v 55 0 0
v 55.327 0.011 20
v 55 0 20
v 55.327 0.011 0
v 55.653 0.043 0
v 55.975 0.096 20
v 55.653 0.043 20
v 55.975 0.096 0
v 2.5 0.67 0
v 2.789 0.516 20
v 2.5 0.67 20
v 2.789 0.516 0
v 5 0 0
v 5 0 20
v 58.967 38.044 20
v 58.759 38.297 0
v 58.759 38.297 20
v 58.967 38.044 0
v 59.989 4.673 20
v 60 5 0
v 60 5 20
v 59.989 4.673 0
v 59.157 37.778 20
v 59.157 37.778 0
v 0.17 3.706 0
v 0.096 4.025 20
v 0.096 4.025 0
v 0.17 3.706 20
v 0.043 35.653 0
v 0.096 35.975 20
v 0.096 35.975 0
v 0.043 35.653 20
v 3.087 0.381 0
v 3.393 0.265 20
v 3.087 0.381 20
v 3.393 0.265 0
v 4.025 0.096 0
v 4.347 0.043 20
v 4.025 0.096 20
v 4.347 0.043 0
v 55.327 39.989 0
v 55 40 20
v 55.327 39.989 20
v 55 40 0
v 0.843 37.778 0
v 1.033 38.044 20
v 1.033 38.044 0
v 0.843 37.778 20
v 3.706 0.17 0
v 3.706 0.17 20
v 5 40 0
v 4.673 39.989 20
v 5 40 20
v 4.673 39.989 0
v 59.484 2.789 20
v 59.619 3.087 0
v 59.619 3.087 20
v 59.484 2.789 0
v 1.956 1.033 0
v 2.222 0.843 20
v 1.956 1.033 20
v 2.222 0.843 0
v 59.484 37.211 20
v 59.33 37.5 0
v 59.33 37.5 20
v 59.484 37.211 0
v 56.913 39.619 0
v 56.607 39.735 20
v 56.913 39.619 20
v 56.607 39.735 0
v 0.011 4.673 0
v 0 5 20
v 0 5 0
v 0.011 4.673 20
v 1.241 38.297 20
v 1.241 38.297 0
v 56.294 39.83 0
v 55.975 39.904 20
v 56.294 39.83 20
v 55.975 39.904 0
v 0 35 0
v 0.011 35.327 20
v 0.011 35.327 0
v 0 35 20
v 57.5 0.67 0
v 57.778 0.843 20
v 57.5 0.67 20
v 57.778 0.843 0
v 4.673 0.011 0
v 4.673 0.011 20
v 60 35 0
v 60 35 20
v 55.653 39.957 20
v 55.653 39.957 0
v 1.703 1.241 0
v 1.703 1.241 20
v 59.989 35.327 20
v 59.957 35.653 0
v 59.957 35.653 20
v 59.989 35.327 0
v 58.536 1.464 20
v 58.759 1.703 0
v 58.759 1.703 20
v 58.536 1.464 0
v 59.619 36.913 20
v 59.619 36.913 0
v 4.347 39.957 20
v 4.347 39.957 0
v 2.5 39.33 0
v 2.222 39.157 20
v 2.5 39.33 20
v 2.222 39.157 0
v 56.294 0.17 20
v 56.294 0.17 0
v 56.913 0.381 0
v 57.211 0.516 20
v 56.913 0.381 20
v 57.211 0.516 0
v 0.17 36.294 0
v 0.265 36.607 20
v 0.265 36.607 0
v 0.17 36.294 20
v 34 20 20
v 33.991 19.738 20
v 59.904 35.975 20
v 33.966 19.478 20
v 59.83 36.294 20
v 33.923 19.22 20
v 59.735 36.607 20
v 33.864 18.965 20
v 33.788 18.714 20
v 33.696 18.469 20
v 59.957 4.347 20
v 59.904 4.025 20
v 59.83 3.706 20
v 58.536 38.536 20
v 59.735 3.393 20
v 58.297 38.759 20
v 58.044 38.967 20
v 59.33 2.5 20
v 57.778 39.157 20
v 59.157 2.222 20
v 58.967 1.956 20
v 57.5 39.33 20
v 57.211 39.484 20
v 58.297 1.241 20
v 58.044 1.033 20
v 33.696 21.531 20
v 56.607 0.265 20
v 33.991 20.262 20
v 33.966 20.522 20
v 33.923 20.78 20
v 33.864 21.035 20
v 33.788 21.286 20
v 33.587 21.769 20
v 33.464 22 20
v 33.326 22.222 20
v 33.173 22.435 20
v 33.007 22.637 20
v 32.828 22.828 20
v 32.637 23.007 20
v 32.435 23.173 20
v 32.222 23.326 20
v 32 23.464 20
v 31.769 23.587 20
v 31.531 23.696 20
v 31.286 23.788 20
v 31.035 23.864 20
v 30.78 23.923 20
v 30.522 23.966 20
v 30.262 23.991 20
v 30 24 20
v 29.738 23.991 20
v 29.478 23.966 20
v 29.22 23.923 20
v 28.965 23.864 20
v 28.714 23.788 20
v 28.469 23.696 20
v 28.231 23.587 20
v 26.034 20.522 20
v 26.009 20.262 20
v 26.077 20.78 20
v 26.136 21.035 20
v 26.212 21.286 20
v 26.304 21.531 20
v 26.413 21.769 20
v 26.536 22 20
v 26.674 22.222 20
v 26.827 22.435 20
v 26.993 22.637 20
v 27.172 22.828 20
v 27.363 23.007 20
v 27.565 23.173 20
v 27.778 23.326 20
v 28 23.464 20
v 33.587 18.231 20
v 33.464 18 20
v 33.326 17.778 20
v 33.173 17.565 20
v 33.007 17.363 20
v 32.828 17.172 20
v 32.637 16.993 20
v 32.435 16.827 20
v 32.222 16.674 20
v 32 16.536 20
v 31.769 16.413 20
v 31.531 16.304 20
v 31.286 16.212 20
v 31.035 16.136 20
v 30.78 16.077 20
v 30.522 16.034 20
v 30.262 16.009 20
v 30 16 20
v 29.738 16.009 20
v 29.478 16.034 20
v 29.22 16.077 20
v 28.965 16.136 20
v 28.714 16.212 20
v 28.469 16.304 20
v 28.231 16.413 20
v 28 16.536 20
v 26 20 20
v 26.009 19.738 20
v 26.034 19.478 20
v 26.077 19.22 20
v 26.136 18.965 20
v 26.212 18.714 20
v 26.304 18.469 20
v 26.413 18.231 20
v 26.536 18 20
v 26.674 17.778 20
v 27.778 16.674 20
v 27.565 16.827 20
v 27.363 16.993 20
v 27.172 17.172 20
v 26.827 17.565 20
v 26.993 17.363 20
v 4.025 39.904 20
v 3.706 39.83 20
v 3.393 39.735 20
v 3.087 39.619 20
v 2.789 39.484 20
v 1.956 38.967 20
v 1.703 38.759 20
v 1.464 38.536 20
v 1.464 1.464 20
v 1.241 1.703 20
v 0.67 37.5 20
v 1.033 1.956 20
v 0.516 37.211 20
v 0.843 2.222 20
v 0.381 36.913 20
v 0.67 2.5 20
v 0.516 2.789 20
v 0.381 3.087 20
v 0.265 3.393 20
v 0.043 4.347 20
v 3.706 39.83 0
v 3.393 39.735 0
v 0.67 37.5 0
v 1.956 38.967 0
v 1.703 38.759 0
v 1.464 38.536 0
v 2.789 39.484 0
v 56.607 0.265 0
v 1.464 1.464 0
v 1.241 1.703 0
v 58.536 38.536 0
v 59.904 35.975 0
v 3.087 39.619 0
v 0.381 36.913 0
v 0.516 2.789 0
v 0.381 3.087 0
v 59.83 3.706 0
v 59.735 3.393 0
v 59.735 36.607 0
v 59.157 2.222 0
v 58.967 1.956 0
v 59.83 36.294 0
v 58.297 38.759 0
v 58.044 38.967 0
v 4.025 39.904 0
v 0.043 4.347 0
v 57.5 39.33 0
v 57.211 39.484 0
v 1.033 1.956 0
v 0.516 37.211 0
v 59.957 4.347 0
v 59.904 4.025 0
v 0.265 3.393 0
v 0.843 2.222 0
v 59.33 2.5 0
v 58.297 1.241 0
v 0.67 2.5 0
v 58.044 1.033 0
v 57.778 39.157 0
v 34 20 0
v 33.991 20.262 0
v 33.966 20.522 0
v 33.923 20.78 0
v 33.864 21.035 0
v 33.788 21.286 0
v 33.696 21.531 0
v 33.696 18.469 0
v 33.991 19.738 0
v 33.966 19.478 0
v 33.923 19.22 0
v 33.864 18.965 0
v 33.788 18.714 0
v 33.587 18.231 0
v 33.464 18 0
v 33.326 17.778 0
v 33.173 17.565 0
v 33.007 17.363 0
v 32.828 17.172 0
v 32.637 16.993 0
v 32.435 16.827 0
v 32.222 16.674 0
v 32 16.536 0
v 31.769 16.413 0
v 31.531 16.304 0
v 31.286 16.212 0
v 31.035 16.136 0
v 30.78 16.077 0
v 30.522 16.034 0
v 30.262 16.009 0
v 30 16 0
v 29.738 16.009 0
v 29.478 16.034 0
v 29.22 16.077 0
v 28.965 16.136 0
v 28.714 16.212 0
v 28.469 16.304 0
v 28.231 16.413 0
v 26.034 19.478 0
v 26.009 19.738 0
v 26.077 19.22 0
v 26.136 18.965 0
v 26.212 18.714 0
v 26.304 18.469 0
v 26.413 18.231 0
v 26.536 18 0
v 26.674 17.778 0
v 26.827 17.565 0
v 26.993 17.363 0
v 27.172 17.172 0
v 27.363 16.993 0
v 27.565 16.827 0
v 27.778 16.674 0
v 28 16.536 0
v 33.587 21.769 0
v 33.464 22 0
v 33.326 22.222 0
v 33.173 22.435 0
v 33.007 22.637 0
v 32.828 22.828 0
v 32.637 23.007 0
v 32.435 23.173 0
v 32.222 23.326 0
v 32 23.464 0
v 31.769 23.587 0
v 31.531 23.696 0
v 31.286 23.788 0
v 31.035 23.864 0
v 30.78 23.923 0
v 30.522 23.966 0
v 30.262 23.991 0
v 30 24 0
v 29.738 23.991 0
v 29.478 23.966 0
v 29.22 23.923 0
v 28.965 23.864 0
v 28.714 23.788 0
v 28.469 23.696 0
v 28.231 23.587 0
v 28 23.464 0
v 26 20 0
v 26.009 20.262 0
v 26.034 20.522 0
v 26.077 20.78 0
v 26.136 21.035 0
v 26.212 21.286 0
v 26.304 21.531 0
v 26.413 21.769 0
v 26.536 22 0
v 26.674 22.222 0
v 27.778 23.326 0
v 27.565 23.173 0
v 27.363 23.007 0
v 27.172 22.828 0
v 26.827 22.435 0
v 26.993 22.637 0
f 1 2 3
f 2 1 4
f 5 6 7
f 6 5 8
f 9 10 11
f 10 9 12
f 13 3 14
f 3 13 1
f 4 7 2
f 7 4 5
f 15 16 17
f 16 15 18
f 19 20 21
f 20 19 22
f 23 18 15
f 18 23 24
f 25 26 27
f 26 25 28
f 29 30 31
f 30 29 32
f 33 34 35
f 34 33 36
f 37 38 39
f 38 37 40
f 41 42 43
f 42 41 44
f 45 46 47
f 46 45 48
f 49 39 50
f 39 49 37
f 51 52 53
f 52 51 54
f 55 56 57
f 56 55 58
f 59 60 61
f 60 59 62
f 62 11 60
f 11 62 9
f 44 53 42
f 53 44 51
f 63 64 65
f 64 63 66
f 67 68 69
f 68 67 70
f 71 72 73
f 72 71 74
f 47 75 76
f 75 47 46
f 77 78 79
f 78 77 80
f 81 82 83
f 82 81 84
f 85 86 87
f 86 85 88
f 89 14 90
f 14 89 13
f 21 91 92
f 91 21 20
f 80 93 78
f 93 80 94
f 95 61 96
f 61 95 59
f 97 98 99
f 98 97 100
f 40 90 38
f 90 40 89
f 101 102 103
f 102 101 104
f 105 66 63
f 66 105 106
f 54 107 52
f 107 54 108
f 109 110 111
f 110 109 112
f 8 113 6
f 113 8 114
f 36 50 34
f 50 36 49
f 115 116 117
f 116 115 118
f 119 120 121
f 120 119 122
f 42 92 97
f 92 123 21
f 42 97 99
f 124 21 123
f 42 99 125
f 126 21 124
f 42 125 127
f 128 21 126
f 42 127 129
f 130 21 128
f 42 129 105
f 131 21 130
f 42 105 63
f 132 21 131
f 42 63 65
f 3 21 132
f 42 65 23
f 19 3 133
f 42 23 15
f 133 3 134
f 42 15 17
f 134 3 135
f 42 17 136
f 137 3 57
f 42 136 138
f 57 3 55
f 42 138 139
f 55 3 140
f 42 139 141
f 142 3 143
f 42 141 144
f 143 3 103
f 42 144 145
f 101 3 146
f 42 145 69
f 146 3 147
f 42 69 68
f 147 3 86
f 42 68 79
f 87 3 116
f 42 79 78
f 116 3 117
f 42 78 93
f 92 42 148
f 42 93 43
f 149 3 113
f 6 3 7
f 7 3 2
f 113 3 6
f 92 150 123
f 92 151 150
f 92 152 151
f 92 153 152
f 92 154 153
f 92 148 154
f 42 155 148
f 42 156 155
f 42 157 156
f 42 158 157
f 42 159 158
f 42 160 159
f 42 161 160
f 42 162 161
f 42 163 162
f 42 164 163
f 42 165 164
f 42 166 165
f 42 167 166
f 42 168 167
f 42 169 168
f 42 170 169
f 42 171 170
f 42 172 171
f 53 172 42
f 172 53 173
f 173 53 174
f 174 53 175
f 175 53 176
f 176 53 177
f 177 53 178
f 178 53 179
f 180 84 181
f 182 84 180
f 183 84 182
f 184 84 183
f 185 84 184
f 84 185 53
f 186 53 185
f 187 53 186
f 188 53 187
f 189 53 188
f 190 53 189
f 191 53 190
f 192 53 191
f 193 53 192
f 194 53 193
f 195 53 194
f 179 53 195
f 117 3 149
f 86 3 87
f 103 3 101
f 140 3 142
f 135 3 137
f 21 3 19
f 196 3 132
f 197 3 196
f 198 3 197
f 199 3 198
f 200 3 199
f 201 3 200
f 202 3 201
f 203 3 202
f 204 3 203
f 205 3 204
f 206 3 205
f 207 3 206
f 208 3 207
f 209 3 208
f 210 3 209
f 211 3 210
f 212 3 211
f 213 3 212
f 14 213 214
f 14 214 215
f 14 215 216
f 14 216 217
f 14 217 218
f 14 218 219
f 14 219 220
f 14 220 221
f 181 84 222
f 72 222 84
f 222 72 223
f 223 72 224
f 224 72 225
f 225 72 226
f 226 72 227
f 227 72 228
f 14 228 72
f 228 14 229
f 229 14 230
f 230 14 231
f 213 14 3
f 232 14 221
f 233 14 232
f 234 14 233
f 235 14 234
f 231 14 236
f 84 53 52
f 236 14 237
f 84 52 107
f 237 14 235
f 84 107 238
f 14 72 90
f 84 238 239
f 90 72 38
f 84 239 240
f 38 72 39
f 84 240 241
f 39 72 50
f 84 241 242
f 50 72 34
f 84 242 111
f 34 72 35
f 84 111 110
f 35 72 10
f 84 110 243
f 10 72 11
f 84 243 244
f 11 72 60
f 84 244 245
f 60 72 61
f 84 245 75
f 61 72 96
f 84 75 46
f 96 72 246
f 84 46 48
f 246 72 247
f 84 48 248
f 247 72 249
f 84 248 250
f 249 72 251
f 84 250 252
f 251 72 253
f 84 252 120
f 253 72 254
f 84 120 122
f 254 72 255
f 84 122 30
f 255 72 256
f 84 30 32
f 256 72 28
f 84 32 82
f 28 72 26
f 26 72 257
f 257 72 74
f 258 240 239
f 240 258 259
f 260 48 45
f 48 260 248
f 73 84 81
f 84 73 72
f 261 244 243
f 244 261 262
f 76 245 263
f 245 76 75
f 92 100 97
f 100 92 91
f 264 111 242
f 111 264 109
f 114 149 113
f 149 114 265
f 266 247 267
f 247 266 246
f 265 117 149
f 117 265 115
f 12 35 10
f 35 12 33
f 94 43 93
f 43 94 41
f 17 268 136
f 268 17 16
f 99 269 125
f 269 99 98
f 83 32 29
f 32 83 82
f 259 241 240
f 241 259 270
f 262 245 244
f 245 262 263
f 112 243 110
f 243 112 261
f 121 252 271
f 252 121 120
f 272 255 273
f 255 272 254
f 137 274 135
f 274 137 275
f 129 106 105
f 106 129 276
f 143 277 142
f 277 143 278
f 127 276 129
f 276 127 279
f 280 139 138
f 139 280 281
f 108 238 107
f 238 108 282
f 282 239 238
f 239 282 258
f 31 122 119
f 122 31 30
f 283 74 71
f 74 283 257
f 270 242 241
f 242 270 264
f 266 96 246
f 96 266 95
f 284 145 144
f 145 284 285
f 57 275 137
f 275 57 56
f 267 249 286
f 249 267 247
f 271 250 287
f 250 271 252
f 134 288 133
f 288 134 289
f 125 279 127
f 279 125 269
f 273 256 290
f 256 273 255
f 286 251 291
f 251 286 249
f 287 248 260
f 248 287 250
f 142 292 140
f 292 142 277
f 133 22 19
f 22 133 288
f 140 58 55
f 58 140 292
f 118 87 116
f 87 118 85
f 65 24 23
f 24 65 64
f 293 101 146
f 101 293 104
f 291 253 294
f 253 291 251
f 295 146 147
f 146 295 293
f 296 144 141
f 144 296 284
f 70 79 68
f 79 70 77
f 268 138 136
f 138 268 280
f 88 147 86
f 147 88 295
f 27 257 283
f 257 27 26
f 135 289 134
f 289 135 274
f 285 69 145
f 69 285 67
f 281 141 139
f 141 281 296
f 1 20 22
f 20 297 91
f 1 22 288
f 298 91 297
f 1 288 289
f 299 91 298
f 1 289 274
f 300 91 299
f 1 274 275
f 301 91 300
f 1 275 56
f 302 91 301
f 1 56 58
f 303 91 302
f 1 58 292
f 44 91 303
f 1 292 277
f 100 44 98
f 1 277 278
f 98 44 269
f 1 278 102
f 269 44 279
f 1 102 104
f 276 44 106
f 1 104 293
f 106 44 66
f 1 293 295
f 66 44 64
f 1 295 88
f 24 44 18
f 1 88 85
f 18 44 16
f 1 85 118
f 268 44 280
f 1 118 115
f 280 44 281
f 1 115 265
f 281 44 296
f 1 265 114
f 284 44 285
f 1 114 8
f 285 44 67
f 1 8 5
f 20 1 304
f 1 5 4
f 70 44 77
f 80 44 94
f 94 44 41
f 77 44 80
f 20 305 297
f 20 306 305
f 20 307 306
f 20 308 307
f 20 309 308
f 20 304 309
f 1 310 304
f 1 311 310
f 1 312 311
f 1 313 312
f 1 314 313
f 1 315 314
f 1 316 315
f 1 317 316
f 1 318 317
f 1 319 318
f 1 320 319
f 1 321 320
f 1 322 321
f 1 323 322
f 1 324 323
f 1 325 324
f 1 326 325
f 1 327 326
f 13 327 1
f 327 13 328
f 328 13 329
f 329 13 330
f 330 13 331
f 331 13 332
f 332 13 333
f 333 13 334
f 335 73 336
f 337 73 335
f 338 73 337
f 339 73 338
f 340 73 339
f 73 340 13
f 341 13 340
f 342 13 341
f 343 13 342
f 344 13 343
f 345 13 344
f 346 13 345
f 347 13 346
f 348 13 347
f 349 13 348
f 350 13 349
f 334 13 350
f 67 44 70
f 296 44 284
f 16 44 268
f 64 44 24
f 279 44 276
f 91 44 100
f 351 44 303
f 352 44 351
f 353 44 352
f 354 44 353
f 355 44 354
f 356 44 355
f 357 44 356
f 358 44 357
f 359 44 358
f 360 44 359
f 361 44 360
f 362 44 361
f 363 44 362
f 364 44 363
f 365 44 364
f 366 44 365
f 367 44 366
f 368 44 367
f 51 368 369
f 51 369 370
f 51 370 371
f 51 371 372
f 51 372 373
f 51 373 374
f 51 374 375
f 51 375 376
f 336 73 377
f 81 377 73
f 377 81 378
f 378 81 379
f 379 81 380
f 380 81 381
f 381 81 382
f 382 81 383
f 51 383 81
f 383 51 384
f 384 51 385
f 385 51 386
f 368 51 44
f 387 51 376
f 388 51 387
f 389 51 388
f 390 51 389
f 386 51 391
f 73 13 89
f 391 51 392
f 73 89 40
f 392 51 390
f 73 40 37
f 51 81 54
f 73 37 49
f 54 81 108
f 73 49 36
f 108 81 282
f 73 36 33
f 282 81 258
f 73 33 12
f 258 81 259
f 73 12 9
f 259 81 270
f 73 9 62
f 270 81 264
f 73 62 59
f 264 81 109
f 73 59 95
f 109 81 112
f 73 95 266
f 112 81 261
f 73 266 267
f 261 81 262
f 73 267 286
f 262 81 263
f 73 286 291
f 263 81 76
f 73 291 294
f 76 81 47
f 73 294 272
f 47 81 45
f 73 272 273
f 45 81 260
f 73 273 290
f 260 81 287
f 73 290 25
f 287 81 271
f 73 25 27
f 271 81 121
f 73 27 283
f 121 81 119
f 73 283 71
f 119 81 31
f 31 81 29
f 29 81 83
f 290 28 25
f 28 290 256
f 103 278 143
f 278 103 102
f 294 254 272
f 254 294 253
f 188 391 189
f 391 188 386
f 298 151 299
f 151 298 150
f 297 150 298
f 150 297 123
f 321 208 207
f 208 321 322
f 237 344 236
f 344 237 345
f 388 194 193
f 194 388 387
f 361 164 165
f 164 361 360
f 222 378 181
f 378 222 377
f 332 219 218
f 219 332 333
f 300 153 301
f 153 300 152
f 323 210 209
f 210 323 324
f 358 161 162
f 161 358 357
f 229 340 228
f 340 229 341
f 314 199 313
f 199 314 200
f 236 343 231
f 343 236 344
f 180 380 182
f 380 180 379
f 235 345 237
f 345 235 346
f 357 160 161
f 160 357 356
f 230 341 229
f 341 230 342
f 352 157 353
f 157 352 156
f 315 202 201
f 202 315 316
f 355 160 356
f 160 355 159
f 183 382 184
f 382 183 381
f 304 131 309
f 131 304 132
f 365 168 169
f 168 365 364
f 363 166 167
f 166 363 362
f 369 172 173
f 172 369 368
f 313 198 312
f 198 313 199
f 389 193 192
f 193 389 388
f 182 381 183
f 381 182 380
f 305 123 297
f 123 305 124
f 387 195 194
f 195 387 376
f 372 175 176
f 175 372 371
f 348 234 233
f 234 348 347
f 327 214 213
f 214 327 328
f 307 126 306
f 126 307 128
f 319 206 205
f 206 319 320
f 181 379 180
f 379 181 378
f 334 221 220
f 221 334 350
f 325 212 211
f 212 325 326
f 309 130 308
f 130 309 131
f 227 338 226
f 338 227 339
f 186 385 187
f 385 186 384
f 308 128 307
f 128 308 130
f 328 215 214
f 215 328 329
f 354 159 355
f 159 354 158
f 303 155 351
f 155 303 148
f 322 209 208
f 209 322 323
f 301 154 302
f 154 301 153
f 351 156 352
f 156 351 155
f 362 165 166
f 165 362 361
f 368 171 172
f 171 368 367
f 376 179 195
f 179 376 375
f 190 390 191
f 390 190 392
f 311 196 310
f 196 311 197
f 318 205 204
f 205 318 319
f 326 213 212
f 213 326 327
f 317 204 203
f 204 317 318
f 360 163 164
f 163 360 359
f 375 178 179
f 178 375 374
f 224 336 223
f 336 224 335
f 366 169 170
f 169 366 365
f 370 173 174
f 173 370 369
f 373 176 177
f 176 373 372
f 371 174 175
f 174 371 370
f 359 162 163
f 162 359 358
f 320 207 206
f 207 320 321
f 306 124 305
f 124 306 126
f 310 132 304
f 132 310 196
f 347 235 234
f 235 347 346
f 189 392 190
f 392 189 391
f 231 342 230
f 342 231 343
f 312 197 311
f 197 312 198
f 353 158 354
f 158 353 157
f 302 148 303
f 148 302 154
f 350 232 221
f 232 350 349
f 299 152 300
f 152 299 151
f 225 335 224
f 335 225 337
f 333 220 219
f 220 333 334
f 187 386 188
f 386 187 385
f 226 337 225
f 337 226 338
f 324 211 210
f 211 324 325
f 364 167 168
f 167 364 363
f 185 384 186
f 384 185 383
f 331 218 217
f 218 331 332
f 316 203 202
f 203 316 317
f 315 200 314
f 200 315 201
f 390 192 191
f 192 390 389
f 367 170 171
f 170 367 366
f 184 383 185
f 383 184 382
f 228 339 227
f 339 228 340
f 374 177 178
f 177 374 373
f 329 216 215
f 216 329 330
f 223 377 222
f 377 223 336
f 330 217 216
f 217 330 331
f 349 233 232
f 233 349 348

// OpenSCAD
$fn=96;
radius=5;
difference(){linear_extrude(20) offset(r=radius) translate([radius,radius]) square([60-2*radius,40-2*radius]); translate([30,20,-1]) cylinder(h=22,r=4);}
